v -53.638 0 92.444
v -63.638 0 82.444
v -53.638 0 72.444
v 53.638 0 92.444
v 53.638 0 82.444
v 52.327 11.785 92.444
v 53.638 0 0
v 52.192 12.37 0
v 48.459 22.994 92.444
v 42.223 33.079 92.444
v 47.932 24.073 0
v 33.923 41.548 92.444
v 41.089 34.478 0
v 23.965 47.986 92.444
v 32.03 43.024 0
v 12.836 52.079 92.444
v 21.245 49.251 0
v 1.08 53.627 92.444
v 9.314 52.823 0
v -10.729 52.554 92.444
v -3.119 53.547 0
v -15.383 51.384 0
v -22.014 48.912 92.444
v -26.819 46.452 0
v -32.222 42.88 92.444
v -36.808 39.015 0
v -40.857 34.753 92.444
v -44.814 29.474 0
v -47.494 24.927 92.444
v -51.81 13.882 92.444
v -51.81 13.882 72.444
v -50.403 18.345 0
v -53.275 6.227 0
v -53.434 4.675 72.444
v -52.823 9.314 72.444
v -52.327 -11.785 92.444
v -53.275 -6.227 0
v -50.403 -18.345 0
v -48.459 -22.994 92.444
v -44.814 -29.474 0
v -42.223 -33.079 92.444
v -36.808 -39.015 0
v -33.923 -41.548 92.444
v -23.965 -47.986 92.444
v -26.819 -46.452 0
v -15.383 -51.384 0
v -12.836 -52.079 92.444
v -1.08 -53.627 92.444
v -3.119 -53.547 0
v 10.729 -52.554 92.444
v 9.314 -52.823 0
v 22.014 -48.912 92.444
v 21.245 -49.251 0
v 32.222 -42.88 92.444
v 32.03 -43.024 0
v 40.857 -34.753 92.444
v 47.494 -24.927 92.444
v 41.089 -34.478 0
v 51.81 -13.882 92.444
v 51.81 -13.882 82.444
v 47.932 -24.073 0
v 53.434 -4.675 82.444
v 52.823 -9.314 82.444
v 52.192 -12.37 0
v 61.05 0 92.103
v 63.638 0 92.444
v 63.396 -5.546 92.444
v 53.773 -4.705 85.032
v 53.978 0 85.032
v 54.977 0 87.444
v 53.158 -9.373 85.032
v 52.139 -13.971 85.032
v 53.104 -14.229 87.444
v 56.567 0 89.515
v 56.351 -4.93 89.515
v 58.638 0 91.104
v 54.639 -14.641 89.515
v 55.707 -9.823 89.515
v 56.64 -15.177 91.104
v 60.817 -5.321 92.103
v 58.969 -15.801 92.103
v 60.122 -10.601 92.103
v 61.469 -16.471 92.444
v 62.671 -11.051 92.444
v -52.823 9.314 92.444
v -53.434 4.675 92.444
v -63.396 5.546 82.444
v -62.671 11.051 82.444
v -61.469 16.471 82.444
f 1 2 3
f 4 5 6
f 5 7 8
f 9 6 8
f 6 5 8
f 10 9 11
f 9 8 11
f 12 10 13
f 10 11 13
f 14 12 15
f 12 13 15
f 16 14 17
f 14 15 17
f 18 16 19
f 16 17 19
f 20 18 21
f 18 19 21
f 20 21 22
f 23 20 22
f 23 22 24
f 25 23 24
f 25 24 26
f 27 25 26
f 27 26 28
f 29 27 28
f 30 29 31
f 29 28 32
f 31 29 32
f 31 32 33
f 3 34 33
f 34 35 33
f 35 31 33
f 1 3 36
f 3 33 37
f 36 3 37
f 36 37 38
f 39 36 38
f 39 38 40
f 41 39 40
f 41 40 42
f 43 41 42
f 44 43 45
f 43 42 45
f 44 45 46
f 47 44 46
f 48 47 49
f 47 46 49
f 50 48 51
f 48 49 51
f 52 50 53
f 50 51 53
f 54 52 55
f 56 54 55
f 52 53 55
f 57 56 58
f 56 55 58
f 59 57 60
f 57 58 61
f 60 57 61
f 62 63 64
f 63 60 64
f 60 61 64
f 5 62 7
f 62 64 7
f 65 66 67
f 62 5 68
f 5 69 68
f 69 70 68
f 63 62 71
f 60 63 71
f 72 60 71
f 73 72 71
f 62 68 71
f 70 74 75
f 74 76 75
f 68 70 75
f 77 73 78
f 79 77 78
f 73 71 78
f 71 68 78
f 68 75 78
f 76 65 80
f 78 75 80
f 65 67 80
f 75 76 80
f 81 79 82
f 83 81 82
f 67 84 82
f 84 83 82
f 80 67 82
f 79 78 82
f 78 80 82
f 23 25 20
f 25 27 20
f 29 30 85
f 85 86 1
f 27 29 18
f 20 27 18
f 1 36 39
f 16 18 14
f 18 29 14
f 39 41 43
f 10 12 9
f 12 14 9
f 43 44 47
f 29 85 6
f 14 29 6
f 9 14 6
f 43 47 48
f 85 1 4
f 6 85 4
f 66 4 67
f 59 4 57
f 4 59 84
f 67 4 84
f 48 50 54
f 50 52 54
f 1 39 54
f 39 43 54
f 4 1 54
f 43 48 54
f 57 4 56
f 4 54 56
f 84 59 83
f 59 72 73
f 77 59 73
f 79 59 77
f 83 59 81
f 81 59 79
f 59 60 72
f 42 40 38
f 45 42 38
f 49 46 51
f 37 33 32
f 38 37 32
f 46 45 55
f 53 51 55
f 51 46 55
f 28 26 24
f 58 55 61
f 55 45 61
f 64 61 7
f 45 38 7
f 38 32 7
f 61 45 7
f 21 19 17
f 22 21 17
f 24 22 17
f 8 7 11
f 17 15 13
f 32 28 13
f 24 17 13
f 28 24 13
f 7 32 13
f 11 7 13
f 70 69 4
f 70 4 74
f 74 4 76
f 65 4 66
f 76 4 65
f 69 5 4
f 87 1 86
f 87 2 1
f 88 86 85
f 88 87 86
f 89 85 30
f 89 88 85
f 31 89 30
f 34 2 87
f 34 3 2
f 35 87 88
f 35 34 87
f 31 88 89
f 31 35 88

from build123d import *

# Parameters (mm, degrees)
F0_R     = 53.637742
F1_DEPTH = 92.44411
F3_ANGLE = 15
F4_ANGLE = 15


with BuildPart() as f1:
    # F0 (on Top) → F1 (new body)
    with BuildSketch(Plane.XY):
        Circle(F0_R)
    extrude(amount=F1_DEPTH)

    # F2 (on Front) → F3 (revolve)
    with BuildSketch(Plane.XZ):
        with BuildLine():
            Line((63.637742, 92.44411), (53.637742, 92.44411))
            Line((53.637742, 92.44411), (53.637742, 82.44411))
            ThreePointArc((53.637742, 82.44411), (56.566675, 89.515178), (63.637742, 92.44411))
        make_face()
    revolve(axis=Axis((0, 0, 0), (0, 0, -1)), revolution_arc=F3_ANGLE)

    # F2 (on Front) → F4 (revolve)
    with BuildSketch(Plane.XZ):
        Polygon((-63.637742, 82.44411), (-53.637742, 72.44411), (-53.637742, 92.44411), align=None)
    revolve(axis=Axis((0, 0, 0), (0, 0, -1)), revolution_arc=F4_ANGLE)


solid = f1.part
